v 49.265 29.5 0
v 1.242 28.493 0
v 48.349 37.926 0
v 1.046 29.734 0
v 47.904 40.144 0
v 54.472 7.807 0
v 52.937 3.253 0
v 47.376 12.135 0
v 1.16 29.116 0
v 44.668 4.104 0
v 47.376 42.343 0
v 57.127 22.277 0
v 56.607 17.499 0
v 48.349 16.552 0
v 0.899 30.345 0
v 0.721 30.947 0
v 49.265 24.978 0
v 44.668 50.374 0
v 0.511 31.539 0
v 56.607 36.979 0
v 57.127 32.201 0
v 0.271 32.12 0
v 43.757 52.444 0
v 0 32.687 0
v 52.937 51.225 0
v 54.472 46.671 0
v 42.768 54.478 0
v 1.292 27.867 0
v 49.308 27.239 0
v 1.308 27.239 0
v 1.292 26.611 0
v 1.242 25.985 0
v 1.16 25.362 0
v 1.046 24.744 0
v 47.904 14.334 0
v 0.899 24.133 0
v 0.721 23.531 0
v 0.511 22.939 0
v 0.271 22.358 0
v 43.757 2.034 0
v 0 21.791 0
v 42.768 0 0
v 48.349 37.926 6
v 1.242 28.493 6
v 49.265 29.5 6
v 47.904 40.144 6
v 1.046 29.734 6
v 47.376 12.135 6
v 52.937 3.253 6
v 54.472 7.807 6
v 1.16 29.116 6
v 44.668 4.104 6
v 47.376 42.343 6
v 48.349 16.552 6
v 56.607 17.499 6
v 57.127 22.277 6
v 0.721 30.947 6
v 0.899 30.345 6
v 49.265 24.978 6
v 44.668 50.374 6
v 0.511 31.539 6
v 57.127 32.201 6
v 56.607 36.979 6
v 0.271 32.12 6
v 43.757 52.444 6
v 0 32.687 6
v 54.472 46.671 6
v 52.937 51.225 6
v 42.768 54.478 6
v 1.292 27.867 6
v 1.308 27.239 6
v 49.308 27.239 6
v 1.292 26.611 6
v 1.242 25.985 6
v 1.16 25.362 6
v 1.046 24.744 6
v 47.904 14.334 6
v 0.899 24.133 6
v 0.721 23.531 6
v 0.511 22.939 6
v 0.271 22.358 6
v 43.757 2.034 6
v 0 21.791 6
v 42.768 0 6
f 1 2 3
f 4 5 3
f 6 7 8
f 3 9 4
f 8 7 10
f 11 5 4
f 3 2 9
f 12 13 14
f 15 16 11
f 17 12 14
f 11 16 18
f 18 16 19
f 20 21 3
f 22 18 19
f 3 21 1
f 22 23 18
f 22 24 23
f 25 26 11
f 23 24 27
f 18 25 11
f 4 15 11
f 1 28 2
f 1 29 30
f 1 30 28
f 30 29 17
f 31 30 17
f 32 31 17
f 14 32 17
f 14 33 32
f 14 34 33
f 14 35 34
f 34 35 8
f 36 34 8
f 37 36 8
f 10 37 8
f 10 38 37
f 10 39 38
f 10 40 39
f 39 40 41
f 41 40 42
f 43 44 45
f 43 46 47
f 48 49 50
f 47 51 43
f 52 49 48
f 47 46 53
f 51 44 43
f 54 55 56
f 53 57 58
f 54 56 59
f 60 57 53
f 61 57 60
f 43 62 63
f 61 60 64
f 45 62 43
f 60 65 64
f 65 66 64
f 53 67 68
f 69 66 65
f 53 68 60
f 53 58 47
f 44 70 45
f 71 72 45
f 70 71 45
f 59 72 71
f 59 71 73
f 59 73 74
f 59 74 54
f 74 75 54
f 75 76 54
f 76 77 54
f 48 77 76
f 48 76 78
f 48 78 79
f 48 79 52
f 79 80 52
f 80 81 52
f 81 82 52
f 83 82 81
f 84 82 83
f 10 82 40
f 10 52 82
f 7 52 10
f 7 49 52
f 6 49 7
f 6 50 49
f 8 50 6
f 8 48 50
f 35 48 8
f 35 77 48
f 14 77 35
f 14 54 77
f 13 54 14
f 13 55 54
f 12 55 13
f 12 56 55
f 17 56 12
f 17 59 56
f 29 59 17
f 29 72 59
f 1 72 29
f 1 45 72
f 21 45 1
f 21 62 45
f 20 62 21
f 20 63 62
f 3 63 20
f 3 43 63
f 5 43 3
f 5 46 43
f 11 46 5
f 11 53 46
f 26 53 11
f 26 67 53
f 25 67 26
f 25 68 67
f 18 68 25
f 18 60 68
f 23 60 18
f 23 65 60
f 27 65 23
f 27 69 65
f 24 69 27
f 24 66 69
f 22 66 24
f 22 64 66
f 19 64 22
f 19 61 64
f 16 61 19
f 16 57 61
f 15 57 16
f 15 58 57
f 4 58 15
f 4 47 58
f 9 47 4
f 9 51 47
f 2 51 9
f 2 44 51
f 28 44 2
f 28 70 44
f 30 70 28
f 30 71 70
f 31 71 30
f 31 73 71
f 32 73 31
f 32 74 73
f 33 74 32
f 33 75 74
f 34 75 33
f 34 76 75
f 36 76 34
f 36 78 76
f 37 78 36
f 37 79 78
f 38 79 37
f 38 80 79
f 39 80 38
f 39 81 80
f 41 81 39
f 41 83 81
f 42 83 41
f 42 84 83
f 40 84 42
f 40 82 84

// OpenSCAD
$fn = 32;

// ----------------------------------------------------------------------
// Gear sector: 4 teeth on 54 degrees
// ----------------------------------------------------------------------

// --- parameters (mm) ---
sector_angle = 54;        // sector angle, degrees
root_r = 60;              // root circle radius
tooth_h = 8;              // tooth height over the root circle
teeth = 4;                // number of teeth on the sector
hub_r = 12;               // hub bore radius
plate_t = 6;              // sector thickness, Z
arc_step = 3;             // sampling step of the root/hub arcs, degrees

tip_r = root_r + tooth_h;  // tip circle radius

profile = [[42.768, 0], [43.757, 2.034], [44.668, 4.104], [52.937, 3.253], [54.472, 7.807], [47.376, 12.135], [47.904, 14.334], [48.349, 16.552], [56.607, 17.499], [57.127, 22.277], [49.265, 24.978], [49.308, 27.239], [49.265, 29.5], [57.127, 32.201], [56.607, 36.979], [48.349, 37.926], [47.904, 40.144], [47.376, 42.343], [54.472, 46.671], [52.937, 51.225], [44.668, 50.374], [43.757, 52.444], [42.768, 54.478], [0, 32.687], [0.271, 32.12], [0.511, 31.539], [0.721, 30.947], [0.899, 30.345], [1.046, 29.734], [1.16, 29.116], [1.242, 28.493], [1.292, 27.867], [1.308, 27.239], [1.292, 26.611], [1.242, 25.985], [1.16, 25.362], [1.046, 24.744], [0.899, 24.133], [0.721, 23.531], [0.511, 22.939], [0.271, 22.358], [0, 21.791]];  // primary outline, 42 points, counter clockwise

// --- the one profile operation ---
linear_extrude(height = plate_t) polygon(points = profile);
